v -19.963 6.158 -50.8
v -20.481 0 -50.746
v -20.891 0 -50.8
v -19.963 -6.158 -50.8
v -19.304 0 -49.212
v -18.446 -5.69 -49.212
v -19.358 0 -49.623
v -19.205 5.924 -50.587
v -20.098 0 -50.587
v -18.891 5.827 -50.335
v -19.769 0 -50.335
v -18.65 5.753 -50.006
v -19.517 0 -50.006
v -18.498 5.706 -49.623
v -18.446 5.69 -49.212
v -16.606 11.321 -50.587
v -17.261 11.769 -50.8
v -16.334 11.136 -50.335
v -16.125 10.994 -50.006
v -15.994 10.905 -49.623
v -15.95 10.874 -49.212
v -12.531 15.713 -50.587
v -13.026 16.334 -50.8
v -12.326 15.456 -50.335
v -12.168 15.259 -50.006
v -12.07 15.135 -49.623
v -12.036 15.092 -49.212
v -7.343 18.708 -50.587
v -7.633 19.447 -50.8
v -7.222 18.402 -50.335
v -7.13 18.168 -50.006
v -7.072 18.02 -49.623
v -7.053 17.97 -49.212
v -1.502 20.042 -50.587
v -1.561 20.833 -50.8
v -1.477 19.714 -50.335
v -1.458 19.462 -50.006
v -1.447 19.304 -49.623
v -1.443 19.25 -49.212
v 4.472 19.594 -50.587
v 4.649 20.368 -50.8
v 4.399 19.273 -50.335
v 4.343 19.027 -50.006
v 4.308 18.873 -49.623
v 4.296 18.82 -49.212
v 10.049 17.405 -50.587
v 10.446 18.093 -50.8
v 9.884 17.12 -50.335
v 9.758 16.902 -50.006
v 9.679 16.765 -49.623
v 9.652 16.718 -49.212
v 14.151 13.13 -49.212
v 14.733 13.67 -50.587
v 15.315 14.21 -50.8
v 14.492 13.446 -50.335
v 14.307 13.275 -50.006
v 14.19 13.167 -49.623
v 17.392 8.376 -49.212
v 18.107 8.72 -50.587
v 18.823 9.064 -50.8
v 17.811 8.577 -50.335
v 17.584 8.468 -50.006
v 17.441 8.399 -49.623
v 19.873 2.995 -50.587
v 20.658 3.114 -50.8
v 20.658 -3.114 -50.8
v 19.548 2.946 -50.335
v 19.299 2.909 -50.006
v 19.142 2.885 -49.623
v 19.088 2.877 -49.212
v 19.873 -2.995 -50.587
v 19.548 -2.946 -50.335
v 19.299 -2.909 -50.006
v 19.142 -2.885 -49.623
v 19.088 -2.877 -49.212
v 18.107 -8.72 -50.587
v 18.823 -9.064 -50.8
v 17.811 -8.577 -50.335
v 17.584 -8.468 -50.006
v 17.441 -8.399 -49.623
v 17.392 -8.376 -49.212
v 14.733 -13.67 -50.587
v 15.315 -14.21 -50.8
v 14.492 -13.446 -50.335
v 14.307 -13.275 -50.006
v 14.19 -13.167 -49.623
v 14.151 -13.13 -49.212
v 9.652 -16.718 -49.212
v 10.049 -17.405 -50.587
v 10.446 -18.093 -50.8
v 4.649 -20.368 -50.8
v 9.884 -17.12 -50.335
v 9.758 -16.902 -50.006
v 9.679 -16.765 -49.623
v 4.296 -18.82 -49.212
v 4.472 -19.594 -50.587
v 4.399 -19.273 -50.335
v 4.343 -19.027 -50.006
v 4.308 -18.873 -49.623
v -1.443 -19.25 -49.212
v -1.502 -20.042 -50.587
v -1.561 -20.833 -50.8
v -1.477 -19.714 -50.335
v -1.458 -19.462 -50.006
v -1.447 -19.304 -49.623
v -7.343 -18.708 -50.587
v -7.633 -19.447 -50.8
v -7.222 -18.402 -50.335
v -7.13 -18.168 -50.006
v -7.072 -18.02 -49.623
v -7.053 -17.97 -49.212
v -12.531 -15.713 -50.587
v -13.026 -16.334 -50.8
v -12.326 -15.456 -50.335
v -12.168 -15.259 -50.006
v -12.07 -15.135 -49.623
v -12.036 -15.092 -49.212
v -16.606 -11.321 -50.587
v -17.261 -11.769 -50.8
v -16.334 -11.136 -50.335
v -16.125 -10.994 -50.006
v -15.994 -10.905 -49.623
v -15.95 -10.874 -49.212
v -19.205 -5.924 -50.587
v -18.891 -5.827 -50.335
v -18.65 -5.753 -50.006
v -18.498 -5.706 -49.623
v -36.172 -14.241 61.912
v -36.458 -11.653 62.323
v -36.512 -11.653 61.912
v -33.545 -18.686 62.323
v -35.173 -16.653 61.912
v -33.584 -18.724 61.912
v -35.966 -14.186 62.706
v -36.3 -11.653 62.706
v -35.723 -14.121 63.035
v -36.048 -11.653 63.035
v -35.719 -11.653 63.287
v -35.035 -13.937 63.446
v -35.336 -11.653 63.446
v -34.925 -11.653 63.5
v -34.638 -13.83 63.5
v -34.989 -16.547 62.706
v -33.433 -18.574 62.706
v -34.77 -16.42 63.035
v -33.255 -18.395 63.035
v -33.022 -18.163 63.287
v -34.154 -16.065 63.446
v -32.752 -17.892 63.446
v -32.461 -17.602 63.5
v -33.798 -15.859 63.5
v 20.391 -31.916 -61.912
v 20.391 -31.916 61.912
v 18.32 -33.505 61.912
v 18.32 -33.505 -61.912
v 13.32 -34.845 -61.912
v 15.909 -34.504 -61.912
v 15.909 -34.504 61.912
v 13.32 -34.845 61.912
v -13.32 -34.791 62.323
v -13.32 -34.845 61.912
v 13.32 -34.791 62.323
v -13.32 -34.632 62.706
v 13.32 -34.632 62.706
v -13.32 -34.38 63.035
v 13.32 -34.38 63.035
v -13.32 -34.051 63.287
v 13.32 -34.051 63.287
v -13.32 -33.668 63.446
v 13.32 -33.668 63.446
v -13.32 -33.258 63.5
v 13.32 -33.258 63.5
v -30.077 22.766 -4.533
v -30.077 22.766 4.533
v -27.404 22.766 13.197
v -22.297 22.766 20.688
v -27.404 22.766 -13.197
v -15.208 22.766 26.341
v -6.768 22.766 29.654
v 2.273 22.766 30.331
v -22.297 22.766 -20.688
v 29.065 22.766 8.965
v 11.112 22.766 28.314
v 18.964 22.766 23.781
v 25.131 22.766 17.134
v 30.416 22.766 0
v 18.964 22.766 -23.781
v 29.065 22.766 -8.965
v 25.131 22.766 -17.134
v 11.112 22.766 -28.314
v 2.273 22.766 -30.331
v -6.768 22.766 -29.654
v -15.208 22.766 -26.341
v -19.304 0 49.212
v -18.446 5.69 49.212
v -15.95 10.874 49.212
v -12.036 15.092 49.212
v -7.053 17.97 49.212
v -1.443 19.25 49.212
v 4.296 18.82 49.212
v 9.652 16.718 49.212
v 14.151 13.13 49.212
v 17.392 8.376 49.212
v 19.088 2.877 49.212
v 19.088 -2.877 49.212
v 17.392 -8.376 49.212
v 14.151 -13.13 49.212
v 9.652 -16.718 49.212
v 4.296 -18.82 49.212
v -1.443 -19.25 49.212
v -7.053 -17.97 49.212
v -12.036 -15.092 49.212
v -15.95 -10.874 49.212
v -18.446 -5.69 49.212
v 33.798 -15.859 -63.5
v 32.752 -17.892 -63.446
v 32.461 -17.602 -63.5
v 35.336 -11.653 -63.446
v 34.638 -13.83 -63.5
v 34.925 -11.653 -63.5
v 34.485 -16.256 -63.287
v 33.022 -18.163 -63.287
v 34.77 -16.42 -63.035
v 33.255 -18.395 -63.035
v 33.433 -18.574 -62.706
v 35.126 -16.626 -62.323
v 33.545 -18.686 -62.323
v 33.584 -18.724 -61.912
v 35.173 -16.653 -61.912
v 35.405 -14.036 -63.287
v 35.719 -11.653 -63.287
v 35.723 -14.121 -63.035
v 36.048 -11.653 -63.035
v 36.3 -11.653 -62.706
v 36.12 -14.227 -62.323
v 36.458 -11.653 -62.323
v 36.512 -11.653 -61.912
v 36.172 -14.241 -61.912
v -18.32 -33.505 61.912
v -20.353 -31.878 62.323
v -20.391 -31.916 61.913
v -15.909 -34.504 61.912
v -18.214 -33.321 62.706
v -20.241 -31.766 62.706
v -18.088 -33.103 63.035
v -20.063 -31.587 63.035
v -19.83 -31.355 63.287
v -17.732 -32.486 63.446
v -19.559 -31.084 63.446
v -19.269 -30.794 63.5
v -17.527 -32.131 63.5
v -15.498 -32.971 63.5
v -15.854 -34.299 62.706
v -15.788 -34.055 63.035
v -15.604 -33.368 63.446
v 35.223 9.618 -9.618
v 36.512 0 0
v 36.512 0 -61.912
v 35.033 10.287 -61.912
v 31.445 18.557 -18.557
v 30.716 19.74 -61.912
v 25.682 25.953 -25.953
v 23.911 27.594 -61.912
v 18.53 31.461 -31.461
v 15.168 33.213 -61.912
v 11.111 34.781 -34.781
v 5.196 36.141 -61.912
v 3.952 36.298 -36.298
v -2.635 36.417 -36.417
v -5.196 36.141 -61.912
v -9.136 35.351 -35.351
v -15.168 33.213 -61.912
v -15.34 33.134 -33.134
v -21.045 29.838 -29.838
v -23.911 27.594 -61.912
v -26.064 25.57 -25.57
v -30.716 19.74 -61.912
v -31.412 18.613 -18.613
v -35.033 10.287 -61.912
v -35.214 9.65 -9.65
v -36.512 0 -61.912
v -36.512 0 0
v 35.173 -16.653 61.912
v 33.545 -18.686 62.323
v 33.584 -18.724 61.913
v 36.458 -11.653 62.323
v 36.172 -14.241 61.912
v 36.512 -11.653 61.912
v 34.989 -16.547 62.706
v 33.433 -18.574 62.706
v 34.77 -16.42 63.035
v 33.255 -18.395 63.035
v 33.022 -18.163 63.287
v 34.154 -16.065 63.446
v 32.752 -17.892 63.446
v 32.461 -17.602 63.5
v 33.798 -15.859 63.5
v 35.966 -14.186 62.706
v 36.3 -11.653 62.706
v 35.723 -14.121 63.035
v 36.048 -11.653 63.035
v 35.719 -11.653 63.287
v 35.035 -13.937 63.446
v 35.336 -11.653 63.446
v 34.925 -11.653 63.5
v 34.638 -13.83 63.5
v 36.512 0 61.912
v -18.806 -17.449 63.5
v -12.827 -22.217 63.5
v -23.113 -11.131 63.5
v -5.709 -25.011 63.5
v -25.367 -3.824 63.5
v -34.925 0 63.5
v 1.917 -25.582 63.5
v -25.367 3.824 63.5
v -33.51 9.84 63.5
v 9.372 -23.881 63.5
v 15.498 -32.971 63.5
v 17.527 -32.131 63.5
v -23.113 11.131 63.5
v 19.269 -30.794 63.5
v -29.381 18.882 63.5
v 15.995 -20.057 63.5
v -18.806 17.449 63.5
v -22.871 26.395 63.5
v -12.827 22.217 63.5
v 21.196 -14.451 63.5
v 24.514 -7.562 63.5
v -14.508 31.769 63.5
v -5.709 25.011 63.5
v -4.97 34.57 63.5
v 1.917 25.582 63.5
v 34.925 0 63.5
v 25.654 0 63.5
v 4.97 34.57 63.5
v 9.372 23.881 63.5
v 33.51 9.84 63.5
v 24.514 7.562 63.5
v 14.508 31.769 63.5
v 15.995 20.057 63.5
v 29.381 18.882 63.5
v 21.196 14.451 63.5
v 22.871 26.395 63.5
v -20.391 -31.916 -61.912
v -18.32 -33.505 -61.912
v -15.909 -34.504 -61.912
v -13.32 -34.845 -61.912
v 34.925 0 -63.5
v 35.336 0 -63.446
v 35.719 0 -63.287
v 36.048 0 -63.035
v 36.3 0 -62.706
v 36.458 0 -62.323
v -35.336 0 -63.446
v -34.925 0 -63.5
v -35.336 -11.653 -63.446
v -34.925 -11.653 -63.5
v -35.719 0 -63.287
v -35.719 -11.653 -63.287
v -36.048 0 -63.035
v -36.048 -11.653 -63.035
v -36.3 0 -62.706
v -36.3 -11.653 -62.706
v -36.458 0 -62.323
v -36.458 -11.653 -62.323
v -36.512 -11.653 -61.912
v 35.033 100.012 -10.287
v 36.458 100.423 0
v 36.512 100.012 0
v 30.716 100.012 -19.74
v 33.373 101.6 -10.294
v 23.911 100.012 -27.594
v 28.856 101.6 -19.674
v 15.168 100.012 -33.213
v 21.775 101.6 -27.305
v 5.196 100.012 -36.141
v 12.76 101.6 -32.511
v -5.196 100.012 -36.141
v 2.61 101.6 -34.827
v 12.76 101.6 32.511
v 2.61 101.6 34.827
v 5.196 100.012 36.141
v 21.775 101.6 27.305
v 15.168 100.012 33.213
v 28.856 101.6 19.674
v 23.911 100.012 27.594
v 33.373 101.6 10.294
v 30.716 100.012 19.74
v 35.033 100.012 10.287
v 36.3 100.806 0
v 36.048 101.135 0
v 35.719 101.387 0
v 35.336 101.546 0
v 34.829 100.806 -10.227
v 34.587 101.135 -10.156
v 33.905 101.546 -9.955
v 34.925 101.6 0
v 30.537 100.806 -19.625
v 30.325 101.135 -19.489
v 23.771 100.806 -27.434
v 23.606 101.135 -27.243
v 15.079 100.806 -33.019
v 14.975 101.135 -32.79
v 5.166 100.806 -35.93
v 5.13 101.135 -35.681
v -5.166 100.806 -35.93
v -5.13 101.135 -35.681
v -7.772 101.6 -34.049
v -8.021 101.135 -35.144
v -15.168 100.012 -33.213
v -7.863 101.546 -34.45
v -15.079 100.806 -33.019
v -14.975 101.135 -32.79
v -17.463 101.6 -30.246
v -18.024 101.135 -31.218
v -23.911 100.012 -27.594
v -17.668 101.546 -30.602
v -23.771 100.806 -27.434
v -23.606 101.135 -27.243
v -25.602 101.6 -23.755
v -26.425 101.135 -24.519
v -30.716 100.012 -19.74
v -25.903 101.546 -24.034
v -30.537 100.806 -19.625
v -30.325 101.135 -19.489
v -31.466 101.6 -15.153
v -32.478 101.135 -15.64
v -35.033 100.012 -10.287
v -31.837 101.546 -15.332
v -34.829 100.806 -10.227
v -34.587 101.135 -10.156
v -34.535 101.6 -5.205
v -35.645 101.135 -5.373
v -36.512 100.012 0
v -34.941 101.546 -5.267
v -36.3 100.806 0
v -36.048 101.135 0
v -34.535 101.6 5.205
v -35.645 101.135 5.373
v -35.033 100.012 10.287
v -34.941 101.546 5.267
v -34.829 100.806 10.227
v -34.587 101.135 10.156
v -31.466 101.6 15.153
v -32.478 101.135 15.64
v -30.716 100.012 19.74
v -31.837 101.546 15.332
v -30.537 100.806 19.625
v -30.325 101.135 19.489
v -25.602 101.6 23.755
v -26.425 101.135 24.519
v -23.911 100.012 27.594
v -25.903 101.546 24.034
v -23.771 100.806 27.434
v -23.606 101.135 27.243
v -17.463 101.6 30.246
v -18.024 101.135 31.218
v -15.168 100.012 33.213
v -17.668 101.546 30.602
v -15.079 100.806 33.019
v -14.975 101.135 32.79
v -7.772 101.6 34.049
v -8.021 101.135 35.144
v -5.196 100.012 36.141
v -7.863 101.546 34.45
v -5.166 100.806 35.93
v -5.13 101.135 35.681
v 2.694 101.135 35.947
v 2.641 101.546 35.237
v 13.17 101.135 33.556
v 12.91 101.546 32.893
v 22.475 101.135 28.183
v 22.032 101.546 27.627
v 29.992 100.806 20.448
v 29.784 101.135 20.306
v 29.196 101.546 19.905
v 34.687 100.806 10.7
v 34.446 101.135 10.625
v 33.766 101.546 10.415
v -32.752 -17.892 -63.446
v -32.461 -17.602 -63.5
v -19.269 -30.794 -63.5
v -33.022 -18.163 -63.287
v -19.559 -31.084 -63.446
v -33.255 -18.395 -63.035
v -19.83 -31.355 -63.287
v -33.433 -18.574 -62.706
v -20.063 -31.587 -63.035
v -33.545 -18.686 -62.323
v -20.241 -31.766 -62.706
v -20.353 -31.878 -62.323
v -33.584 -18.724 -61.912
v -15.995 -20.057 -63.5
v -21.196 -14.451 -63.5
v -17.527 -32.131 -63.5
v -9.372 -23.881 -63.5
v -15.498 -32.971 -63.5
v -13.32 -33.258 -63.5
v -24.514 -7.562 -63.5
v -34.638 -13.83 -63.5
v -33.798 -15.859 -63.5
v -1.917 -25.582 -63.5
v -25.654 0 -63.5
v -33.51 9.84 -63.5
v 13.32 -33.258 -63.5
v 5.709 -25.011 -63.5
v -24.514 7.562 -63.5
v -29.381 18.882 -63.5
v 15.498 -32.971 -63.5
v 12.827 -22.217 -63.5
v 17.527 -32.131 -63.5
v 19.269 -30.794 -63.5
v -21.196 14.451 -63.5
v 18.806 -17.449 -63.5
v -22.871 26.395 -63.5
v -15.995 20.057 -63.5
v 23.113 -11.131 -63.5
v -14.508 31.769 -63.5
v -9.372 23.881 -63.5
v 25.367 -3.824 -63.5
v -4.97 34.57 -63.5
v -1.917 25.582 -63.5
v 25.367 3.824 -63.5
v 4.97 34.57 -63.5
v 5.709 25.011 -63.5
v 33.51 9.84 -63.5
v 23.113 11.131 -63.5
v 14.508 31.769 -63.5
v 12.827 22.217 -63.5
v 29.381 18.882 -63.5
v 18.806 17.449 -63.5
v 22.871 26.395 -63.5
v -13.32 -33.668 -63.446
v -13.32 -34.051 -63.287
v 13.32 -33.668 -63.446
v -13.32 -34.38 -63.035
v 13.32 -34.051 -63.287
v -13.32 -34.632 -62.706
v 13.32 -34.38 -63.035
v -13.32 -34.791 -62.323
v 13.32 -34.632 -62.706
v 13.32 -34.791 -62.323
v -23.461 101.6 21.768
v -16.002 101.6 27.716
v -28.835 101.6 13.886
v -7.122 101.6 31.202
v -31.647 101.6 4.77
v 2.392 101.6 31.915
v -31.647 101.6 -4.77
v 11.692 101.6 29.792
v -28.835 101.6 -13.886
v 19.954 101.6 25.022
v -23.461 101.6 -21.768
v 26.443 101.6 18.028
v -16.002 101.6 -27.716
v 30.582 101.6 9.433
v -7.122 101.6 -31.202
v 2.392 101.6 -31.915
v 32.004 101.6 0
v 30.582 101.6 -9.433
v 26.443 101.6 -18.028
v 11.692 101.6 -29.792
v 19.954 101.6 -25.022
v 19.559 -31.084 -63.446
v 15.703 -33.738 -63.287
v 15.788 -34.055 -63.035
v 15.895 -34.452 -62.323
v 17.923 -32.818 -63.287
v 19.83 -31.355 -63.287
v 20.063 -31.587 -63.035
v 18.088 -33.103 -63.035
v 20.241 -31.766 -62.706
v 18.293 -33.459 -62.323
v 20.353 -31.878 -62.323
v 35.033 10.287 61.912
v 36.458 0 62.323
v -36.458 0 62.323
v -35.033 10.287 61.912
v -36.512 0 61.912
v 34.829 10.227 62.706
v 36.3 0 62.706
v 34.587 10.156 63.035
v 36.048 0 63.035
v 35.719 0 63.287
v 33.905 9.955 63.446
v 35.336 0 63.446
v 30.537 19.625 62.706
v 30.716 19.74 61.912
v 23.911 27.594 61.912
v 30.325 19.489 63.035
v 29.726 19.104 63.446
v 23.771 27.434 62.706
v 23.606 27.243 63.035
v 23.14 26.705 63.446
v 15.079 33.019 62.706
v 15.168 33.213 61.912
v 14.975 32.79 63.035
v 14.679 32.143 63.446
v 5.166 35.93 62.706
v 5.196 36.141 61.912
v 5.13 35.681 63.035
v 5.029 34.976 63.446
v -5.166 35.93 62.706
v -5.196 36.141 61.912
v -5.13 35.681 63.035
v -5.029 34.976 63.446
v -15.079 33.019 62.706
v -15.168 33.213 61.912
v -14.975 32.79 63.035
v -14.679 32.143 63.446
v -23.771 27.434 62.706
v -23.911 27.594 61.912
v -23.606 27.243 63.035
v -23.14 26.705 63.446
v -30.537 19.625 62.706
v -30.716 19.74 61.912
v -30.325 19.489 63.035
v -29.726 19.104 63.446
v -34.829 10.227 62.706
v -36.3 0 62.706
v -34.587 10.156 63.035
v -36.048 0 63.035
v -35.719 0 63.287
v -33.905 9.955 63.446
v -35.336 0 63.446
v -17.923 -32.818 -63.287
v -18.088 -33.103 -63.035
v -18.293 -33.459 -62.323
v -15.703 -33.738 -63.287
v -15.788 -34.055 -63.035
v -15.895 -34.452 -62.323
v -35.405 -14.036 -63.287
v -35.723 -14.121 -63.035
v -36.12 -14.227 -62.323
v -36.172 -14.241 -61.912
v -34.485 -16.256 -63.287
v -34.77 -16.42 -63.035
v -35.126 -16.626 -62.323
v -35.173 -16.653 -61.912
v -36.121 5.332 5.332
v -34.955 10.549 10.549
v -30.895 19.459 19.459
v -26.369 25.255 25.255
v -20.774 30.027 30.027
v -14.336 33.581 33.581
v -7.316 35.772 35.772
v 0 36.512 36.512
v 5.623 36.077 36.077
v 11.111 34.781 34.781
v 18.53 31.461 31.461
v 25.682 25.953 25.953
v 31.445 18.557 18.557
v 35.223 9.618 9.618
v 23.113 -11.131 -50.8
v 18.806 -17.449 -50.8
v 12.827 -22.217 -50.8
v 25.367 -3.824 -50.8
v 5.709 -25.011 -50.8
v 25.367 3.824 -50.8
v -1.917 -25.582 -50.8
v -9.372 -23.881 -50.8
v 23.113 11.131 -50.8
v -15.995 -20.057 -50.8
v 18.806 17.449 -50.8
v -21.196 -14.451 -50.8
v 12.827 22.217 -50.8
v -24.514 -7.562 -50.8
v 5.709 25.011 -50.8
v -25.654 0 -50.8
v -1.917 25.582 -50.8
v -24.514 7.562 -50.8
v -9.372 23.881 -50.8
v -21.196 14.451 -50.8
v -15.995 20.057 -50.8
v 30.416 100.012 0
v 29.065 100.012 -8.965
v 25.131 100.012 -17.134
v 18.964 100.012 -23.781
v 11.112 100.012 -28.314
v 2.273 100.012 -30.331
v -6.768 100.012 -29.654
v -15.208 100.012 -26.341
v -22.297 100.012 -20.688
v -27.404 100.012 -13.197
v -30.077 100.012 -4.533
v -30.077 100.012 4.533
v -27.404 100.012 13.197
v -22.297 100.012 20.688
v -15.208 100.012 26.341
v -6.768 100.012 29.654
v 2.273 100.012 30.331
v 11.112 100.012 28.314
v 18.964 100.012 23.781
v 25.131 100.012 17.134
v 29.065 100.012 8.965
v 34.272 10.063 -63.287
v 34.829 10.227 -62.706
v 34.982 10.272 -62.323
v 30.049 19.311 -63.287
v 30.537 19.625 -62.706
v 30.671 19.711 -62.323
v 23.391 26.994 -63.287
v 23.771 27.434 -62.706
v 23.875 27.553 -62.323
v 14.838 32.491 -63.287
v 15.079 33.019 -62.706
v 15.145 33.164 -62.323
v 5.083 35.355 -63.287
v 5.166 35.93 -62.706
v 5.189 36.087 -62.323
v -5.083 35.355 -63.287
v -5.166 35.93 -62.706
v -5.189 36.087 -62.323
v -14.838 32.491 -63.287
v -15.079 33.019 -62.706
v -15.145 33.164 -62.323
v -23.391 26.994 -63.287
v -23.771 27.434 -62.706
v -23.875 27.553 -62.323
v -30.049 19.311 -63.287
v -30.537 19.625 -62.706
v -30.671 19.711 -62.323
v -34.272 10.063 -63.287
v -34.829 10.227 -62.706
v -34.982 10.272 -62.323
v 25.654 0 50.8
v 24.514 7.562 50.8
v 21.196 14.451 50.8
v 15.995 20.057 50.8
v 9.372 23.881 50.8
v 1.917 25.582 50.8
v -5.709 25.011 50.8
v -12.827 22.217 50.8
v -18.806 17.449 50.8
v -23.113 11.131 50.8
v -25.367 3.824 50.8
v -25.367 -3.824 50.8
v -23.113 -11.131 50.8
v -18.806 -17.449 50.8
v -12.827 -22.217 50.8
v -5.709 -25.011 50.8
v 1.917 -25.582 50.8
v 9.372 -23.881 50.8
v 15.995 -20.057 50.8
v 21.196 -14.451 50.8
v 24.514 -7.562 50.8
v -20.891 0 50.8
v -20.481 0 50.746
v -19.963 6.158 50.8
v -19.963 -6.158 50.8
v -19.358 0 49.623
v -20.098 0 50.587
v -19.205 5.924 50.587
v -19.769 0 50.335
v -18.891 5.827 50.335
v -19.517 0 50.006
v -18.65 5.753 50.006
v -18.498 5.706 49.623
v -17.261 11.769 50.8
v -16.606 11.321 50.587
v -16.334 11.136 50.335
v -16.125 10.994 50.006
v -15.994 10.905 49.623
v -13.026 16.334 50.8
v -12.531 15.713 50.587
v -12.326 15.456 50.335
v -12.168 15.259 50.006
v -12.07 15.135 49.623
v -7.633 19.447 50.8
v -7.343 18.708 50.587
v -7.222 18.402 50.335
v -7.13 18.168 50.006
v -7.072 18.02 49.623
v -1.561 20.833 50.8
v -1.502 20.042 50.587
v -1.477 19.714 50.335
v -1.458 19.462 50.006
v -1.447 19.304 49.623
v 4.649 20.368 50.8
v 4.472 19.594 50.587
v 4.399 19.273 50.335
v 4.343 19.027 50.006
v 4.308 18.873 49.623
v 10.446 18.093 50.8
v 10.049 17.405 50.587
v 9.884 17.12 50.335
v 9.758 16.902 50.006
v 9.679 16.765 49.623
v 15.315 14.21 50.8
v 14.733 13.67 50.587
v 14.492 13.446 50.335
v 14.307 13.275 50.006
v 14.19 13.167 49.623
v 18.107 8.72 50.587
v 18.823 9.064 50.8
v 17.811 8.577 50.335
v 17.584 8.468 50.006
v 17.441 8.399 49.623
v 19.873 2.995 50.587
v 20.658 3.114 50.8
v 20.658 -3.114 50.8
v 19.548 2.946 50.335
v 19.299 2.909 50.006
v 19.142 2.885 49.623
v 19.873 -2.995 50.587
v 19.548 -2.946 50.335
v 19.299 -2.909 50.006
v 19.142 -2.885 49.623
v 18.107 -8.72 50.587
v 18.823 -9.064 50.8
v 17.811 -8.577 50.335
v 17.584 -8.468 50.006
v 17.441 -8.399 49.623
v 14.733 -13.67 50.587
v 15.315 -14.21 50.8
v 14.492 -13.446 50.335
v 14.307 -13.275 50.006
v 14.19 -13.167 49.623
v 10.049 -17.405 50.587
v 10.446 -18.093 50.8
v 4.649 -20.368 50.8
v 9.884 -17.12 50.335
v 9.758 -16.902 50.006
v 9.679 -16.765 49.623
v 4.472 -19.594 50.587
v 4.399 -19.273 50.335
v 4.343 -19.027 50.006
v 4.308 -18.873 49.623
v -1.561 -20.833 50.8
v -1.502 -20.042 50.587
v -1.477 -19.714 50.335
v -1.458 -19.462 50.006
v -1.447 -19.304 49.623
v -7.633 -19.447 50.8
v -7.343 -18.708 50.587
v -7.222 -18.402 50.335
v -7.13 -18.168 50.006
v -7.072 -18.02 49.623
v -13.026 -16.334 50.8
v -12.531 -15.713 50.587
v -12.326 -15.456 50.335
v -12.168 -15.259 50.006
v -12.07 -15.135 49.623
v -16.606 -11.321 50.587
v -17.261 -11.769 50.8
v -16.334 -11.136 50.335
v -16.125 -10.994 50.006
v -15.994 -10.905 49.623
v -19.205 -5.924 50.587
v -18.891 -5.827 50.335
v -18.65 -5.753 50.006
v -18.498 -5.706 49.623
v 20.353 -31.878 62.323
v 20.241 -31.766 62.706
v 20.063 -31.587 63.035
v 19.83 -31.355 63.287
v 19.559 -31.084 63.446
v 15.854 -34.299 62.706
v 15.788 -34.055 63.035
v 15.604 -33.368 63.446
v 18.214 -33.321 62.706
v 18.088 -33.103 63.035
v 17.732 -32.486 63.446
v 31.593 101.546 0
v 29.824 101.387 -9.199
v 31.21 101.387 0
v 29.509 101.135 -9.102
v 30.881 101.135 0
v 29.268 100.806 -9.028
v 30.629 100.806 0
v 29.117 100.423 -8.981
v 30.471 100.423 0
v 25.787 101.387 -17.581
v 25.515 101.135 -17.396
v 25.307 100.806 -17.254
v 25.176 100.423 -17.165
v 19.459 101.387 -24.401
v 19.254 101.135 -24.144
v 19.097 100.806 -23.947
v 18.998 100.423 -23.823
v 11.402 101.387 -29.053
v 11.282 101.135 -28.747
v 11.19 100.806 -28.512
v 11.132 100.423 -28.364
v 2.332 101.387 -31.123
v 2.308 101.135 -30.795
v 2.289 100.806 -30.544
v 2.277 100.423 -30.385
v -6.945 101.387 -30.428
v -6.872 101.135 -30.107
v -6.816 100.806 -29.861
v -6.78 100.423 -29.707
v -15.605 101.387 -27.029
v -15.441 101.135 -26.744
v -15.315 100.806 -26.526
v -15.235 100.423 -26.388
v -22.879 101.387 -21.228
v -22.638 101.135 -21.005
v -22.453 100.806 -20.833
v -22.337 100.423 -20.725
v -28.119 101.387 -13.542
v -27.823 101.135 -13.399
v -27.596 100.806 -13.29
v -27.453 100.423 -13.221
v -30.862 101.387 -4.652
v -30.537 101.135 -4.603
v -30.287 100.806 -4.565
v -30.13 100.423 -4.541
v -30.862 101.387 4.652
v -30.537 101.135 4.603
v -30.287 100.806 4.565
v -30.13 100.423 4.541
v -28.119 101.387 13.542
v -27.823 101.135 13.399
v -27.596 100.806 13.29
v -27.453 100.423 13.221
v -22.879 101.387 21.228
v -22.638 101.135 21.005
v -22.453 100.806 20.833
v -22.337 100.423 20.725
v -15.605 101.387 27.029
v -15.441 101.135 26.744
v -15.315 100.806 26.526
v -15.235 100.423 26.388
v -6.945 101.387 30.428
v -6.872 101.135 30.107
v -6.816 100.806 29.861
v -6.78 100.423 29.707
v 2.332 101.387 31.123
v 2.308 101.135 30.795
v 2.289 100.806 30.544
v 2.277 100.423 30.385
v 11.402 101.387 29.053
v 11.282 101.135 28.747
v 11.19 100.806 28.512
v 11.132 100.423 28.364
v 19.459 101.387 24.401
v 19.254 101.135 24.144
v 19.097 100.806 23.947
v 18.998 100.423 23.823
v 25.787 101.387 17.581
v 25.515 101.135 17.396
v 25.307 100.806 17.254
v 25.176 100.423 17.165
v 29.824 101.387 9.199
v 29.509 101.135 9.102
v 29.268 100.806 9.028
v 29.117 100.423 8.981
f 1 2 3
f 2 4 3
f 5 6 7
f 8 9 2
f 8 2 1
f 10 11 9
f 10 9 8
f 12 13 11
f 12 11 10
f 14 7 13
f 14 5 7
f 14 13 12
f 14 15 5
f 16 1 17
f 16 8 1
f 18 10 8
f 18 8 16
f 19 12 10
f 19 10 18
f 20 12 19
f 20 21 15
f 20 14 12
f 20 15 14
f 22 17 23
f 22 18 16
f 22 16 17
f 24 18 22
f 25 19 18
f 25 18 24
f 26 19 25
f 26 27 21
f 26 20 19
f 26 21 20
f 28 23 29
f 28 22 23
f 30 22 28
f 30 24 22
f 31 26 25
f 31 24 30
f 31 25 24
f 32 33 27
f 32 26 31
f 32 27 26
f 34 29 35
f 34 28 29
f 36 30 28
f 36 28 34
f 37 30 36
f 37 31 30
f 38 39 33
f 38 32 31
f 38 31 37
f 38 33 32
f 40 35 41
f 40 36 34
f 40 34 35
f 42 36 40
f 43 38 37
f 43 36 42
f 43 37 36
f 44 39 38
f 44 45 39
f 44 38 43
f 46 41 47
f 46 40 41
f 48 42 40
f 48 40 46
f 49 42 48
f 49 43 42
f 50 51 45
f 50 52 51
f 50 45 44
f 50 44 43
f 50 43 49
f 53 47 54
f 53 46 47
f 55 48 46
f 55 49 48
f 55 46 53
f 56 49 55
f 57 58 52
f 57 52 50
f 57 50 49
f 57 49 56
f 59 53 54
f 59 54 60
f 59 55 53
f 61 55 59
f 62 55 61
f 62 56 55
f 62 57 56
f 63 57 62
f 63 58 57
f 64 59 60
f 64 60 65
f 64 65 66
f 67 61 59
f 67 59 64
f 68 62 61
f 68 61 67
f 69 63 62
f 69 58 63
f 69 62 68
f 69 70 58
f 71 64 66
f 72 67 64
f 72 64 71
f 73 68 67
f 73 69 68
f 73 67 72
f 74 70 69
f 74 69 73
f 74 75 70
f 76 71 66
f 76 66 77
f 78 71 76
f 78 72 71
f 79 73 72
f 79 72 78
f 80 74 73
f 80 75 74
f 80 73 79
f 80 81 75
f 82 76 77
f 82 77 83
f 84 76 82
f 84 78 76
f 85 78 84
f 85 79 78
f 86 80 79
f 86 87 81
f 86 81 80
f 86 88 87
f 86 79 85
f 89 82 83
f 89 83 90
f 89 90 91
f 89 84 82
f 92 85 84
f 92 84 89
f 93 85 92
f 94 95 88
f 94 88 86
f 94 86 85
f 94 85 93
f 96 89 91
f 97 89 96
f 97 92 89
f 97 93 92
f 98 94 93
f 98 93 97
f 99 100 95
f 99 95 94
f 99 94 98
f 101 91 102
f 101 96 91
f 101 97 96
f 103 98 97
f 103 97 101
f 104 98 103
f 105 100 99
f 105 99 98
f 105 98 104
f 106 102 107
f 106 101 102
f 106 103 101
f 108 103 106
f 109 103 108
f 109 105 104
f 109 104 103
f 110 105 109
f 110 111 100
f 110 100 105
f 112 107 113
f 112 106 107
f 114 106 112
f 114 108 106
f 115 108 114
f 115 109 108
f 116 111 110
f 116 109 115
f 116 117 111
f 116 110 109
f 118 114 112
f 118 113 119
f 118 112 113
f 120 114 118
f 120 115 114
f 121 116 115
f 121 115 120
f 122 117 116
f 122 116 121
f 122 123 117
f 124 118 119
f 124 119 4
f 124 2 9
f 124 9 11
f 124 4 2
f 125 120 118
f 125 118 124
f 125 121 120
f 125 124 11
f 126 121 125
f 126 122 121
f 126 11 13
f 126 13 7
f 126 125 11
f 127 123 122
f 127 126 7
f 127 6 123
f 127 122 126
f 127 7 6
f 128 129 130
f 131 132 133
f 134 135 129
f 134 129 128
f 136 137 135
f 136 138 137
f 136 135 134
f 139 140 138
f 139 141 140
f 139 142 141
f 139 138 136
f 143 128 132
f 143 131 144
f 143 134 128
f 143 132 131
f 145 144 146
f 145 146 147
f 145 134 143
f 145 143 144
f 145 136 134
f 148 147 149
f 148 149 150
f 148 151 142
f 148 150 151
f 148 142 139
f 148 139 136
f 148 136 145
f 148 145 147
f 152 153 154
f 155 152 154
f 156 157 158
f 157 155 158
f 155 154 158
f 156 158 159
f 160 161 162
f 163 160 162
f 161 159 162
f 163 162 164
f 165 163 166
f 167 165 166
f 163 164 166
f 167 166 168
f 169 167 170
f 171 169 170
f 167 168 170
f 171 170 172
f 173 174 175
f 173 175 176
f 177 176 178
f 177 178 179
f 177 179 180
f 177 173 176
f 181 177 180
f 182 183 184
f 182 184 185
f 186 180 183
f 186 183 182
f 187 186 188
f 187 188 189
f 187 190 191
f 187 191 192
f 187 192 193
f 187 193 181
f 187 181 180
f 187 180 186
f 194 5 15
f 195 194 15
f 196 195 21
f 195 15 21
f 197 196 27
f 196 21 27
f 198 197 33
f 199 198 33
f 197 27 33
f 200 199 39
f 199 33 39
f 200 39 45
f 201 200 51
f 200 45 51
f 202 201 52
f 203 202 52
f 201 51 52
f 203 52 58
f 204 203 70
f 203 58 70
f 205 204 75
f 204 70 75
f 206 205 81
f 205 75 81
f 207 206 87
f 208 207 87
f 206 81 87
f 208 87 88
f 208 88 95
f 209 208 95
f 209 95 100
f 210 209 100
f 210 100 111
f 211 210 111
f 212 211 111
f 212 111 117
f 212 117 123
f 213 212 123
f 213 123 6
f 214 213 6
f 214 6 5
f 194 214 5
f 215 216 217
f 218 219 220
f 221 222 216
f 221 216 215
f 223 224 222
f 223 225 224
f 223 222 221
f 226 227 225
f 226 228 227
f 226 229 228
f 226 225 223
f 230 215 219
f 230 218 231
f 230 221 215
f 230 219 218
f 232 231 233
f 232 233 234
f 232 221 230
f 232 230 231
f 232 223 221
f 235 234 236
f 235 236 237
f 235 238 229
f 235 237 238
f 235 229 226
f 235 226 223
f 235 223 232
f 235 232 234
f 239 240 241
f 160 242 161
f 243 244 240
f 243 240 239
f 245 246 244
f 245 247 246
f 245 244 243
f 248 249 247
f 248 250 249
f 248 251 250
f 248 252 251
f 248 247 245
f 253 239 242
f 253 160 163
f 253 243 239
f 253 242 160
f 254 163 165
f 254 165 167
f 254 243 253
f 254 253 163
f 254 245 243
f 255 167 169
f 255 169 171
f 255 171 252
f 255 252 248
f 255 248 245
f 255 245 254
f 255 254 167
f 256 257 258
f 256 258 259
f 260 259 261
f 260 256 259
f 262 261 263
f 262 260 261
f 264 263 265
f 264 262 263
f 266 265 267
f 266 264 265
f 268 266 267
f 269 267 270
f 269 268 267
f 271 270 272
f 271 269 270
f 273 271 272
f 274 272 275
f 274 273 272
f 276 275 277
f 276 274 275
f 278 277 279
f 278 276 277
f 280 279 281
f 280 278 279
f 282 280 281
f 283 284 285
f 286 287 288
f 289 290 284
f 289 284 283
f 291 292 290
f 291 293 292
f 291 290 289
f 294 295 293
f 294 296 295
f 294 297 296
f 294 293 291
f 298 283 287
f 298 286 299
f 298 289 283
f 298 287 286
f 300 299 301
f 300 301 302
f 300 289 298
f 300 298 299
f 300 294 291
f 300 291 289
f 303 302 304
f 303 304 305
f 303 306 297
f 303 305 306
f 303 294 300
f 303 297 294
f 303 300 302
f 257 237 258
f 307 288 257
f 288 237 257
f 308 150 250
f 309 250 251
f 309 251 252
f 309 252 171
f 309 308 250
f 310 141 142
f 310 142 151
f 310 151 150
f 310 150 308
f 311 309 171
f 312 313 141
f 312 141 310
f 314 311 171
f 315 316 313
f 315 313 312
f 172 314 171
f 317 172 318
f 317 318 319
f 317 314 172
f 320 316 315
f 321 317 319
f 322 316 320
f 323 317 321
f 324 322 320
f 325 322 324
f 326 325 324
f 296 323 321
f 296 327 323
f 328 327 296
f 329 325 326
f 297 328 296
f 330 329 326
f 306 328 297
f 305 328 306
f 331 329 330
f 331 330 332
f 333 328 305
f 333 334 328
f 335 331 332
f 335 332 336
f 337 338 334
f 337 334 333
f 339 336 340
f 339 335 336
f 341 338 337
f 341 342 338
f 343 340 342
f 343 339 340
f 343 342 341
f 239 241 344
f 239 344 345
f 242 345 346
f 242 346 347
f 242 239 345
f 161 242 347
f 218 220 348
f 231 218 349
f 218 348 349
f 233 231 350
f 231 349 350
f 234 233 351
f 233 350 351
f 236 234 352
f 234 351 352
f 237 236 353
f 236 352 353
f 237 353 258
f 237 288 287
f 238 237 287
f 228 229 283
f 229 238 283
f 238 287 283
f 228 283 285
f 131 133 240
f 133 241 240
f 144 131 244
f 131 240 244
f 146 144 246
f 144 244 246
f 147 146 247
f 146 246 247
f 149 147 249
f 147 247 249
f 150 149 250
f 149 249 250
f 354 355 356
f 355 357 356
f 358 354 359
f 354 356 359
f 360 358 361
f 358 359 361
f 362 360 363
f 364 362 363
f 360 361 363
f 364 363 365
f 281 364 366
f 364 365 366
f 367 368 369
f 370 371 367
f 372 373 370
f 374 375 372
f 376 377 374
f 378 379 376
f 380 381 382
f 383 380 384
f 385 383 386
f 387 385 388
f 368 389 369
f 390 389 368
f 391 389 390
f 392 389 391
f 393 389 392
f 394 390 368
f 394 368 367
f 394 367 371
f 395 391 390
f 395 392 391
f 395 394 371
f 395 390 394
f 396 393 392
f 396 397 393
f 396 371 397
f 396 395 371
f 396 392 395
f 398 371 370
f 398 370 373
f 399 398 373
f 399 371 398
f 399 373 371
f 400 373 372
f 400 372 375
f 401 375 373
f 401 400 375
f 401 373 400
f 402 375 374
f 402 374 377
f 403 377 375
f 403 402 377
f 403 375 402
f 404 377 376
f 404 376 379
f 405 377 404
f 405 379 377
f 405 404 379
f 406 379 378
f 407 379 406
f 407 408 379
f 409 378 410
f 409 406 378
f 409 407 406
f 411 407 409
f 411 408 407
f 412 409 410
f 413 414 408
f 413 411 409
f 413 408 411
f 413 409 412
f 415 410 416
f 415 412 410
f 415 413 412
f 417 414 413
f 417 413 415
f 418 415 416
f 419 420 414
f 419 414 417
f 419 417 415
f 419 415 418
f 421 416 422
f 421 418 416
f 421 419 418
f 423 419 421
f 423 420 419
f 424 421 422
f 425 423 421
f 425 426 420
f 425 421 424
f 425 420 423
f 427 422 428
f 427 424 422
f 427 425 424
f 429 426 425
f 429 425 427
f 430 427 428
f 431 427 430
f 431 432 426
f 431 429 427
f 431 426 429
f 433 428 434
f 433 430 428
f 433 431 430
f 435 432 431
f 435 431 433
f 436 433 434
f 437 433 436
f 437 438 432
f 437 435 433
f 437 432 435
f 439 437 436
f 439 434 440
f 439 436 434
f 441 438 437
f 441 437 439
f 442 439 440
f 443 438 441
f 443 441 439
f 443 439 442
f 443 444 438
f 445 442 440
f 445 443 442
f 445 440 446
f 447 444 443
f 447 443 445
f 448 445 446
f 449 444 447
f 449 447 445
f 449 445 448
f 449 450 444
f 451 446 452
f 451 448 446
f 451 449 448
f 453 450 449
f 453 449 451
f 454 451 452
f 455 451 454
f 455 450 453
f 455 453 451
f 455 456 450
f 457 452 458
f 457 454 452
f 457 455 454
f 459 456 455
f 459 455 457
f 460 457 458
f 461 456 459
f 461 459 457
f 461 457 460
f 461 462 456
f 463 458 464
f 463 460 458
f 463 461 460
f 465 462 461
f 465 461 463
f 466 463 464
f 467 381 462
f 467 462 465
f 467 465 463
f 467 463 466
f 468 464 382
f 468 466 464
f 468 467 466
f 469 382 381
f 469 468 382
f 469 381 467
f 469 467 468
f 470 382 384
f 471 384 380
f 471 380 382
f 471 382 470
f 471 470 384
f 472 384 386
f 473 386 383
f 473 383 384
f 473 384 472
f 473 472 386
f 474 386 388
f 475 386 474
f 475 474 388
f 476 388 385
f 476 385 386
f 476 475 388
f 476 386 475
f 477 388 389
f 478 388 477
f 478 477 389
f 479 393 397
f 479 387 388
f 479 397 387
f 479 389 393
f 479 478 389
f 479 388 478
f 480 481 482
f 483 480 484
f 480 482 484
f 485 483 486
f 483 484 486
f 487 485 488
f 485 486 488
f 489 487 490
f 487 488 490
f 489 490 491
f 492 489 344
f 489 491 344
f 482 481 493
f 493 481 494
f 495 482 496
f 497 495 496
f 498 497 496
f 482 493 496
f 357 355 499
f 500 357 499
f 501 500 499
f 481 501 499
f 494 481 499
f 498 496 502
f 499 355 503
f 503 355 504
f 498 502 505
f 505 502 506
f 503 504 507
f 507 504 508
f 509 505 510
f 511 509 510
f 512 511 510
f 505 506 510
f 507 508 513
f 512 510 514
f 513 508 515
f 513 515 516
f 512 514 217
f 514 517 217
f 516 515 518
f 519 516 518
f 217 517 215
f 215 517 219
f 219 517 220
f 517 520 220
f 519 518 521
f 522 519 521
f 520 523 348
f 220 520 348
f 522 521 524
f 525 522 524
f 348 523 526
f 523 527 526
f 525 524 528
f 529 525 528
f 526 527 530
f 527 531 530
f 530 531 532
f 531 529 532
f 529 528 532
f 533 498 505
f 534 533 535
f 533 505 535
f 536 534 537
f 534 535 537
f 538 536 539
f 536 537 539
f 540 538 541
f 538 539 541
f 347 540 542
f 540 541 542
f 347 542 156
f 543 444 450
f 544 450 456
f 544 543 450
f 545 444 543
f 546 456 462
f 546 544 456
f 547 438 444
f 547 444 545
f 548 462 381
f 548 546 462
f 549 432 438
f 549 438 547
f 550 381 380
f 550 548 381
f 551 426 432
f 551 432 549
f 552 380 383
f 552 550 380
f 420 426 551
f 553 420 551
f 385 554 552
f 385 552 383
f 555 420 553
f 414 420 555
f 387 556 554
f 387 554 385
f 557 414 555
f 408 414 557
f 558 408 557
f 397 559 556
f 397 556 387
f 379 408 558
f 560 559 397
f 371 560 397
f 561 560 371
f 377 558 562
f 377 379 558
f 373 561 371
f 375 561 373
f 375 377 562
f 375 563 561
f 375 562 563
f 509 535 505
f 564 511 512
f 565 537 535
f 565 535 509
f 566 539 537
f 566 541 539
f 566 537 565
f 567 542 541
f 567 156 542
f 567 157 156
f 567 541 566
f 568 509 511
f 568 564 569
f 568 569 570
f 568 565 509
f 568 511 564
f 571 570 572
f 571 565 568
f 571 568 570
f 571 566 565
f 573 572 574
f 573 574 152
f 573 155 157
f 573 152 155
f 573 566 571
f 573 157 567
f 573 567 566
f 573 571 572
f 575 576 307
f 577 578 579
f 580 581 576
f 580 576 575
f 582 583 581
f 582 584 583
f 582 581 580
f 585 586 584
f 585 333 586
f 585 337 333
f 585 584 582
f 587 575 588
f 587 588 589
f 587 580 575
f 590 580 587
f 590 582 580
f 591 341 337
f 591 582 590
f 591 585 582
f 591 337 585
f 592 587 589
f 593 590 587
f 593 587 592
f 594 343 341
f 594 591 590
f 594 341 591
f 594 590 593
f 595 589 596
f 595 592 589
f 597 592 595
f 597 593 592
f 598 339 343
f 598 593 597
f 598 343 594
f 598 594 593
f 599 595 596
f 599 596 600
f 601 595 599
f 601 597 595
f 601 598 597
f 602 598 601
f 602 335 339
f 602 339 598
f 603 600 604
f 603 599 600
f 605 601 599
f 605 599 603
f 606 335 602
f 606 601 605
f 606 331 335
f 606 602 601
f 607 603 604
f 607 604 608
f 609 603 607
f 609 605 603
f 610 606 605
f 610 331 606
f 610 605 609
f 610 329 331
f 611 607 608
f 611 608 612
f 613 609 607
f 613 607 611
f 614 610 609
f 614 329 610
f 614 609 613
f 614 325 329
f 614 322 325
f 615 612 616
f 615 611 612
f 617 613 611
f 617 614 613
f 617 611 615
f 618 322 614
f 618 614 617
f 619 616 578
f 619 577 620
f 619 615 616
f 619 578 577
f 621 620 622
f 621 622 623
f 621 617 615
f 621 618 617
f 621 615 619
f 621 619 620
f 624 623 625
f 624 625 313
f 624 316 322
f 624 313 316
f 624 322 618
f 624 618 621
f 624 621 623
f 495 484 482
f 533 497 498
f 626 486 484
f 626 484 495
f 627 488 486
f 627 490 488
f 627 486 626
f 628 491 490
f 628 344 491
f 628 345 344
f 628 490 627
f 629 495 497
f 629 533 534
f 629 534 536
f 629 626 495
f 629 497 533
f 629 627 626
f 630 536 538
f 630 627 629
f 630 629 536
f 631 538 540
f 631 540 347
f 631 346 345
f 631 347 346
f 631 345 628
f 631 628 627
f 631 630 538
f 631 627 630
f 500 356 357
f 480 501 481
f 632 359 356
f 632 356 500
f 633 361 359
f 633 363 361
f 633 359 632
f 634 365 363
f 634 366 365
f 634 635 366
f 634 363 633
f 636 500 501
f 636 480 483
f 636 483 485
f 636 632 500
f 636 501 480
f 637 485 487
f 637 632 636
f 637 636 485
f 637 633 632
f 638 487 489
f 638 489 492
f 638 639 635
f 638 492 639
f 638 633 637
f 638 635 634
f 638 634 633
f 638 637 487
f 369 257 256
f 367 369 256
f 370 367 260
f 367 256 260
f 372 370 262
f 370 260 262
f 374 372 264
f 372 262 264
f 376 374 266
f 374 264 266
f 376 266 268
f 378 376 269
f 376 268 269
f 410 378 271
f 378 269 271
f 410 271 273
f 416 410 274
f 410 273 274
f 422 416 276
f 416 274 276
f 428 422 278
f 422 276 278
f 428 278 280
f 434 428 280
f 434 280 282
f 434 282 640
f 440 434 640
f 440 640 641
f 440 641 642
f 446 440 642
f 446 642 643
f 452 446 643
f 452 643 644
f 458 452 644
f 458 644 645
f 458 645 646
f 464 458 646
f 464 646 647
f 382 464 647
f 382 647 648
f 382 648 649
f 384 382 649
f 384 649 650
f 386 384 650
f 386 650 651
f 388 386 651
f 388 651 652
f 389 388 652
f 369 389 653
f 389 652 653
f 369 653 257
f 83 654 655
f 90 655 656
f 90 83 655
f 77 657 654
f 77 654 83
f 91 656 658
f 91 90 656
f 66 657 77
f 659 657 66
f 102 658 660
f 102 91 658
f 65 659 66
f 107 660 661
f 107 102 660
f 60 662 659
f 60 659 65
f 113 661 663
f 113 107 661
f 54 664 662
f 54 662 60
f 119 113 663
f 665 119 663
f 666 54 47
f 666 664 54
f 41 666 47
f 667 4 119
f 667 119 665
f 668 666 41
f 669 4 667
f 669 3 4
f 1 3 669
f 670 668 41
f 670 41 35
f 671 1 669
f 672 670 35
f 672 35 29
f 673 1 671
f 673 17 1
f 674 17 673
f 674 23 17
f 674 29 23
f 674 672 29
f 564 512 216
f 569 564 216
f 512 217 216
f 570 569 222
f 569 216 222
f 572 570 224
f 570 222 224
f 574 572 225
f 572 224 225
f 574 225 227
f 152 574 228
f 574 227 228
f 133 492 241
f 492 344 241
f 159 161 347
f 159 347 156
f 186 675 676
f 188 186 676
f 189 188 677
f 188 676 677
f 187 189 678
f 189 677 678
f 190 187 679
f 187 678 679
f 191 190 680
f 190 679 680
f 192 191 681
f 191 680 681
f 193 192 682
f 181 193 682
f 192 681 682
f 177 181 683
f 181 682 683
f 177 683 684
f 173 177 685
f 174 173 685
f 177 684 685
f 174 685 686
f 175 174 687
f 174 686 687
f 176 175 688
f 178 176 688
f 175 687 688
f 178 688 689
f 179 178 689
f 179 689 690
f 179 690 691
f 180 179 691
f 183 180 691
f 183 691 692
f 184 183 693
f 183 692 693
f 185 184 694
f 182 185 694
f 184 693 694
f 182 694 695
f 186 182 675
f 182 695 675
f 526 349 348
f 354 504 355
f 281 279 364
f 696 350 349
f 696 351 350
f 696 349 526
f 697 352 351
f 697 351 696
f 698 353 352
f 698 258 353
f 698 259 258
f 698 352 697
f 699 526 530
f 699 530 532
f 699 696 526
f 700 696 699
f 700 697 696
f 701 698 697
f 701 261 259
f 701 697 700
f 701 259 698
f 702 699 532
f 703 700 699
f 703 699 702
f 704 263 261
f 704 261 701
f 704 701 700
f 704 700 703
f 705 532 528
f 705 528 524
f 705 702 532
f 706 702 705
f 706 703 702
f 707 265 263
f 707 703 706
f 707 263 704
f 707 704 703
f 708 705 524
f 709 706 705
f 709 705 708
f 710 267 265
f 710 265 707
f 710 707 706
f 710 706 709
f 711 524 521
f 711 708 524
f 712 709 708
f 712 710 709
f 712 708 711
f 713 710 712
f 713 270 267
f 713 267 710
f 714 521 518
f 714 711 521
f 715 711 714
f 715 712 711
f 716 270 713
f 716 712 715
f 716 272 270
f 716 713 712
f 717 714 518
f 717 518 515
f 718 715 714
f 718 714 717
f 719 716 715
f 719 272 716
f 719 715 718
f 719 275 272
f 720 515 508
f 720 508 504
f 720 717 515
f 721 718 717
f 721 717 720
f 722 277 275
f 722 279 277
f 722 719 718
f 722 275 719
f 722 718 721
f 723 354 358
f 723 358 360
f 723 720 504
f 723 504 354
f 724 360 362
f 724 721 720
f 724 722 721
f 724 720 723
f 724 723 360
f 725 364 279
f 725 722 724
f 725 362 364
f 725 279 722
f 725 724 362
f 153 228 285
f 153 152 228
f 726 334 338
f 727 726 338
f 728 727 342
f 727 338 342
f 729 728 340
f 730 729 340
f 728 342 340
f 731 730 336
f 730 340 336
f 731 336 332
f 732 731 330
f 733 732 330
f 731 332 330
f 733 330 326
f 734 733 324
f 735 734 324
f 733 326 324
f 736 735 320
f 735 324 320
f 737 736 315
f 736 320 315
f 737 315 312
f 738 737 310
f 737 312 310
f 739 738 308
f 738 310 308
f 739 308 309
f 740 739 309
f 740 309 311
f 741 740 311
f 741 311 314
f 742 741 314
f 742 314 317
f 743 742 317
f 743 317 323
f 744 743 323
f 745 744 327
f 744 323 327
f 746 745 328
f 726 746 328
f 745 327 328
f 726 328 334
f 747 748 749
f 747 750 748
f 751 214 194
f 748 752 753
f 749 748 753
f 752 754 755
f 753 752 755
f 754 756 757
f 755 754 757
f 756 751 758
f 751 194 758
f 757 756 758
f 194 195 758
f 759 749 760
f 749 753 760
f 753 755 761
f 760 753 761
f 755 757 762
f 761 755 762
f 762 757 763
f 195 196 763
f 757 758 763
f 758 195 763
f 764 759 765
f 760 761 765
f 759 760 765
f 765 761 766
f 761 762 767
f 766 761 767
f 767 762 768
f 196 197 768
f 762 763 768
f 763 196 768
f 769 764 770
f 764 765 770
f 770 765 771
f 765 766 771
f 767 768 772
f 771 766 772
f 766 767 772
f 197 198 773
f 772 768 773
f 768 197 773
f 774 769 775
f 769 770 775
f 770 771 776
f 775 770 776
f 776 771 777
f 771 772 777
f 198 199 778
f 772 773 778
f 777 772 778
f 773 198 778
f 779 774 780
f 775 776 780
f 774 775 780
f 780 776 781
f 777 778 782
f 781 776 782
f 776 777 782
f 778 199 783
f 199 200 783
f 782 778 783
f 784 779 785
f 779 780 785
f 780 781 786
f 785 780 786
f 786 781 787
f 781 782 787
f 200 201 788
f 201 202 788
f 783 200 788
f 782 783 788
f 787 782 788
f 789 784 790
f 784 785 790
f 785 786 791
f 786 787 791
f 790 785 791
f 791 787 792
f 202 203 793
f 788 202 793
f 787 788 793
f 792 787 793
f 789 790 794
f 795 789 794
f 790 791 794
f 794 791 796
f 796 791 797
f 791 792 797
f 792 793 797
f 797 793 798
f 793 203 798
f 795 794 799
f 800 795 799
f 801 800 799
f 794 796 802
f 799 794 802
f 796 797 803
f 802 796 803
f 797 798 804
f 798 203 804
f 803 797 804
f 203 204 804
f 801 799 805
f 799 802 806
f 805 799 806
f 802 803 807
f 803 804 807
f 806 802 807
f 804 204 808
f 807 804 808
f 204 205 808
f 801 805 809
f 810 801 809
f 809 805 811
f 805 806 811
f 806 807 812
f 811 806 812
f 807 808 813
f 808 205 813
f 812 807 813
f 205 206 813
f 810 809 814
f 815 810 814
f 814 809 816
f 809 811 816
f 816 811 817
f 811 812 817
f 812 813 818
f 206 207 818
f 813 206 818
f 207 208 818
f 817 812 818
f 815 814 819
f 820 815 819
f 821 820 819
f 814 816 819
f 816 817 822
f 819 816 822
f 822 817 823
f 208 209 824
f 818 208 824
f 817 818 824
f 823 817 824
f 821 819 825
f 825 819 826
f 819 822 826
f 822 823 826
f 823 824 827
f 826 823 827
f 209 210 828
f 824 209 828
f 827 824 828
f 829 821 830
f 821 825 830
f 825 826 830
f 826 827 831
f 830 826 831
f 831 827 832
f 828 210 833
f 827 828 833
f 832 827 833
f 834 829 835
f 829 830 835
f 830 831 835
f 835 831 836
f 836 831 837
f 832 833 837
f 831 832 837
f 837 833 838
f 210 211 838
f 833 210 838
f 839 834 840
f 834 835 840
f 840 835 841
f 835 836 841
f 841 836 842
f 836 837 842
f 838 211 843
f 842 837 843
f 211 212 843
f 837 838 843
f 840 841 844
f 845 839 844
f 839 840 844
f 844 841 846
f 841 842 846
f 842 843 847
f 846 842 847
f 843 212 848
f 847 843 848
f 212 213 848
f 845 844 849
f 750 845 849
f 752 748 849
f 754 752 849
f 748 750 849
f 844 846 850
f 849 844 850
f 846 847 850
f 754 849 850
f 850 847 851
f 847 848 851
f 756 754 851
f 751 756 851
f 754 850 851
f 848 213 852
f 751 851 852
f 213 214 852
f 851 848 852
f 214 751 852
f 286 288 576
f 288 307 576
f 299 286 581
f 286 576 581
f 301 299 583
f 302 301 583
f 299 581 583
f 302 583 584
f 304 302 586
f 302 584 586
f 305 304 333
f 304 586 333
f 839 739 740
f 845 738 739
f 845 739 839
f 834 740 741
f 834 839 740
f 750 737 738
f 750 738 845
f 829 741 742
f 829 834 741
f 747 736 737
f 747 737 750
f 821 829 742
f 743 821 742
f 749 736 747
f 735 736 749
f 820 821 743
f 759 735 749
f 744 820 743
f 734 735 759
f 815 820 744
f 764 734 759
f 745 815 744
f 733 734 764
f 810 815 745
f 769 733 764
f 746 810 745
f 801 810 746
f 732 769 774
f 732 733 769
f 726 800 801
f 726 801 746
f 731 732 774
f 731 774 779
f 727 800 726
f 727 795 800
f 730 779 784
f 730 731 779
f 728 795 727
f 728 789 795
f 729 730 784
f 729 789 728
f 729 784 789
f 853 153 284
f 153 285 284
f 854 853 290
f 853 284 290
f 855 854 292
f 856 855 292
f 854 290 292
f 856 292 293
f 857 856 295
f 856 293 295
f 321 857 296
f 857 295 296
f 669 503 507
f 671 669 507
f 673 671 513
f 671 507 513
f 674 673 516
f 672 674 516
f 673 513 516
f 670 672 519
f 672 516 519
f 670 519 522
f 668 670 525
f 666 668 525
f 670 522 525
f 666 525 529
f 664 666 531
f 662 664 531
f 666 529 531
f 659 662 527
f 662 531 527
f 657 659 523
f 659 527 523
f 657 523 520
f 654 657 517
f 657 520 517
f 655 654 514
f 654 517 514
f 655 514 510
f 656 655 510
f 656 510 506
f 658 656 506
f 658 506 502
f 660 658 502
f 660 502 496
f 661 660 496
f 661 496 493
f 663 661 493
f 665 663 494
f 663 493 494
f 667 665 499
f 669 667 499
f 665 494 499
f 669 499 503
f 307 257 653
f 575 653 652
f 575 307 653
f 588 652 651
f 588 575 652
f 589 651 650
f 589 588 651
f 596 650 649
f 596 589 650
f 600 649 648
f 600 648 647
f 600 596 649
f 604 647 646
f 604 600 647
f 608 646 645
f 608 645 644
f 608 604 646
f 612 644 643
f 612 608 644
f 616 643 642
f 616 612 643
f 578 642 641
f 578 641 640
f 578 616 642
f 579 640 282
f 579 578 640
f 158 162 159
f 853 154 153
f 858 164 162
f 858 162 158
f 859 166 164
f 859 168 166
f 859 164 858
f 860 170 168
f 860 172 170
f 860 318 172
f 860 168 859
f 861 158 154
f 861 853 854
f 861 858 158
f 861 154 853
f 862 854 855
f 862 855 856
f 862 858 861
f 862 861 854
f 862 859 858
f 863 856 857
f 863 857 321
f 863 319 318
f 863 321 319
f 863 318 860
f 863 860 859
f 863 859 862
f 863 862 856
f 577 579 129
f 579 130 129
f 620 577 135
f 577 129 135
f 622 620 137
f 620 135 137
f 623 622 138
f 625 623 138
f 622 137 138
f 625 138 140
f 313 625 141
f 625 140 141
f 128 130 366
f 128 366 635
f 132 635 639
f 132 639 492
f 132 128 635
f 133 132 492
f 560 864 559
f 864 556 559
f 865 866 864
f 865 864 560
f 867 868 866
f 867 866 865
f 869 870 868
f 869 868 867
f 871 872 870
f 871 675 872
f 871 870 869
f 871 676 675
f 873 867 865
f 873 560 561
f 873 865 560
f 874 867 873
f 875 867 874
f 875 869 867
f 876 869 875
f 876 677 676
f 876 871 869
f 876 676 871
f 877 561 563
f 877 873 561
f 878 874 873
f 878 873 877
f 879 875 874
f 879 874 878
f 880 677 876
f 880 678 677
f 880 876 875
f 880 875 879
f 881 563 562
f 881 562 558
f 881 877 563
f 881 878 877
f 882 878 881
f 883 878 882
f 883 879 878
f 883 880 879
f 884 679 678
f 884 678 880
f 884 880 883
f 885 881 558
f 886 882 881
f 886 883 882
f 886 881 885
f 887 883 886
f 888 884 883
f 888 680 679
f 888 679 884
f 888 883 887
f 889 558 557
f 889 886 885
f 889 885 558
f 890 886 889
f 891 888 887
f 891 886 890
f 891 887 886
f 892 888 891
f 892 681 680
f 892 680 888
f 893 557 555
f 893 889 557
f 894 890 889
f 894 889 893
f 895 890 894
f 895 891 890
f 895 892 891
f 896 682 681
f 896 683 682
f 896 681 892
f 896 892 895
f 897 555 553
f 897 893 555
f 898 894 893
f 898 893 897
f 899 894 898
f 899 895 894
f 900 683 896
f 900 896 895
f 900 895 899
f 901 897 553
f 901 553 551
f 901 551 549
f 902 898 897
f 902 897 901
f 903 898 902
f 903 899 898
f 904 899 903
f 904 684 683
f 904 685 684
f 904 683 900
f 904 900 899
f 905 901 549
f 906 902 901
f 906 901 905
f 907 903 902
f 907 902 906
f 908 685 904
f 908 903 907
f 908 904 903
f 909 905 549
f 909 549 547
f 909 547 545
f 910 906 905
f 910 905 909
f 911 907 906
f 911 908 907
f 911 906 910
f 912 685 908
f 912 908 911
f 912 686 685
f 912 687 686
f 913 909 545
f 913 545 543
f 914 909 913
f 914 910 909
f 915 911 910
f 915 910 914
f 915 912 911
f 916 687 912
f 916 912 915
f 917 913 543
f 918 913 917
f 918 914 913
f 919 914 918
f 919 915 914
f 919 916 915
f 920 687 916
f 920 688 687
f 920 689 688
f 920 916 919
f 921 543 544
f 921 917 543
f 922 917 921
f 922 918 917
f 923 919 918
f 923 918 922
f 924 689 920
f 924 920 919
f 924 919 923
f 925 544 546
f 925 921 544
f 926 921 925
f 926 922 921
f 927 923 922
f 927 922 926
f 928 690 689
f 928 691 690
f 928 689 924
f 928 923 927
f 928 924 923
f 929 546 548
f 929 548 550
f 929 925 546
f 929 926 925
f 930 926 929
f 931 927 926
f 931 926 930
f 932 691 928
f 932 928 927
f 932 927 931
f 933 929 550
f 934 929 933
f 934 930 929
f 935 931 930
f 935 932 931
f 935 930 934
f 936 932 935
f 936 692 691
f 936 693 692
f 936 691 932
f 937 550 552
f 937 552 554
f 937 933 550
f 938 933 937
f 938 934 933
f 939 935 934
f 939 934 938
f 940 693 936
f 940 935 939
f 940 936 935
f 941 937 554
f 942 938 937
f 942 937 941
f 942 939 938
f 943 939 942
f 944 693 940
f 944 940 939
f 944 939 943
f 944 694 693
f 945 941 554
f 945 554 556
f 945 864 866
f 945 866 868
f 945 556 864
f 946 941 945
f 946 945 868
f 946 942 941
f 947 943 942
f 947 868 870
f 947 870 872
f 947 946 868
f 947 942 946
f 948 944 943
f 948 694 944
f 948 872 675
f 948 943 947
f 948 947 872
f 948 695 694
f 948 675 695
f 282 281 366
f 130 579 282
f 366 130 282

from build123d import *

# Parameters (mm, degrees)
BOSS_EXTRUDE1_DEPTH      = 63.5
BOSS_EXTRUDE1_DEPTH_BACK = 63.5
SKETCH3_R                = 36.5125
BOSS_EXTRUDE2_DEPTH      = 101.6
SKETCH4_R                = 19.304
CUT_EXTRUDE1_DEPTH       = 167.6875
SKETCH5_R                = 25.654
CUT_EXTRUDE2_DEPTH       = 12.7
CUT_EXTRUDE3_START       = -12.7
SKETCH6_R                = 25.654
CUT_EXTRUDE3_DEPTH       = 12.7
SKETCH7_R                = 30.4165
CUT_EXTRUDE4_DEPTH       = 78.834
CHAMFER1_SIZE            = 19.05
FILLET1_R                = 10
FILLET2_R                = 1.5875


with BuildPart() as part:
    # Sketch1 → Boss-Extrude1 (new, two sides: drawn at the far end of the back side and taken through both)
    with BuildSketch(Plane.XY.offset(-BOSS_EXTRUDE1_DEPTH_BACK)):
        with BuildLine():
            Line((-36.5125, 0), (-36.5125, -34.845102384))
            Line((-36.5125, -34.845102384), (36.5125, -34.845102384))
            Line((36.5125, -34.845102384), (36.5125, 0))
            ThreePointArc((36.5125, 0), (0, 36.5125), (-36.5125, 0))
        make_face()
    extrude(amount=BOSS_EXTRUDE1_DEPTH + BOSS_EXTRUDE1_DEPTH_BACK)

    # Sketch3 → Boss-Extrude2 (add)
    with BuildSketch(Plane(origin=(0, 0, 0), x_dir=(1, 0, 0), z_dir=(0, 1, 0))):
        Circle(SKETCH3_R)
    extrude(amount=BOSS_EXTRUDE2_DEPTH)

    # Sketch4 → Cut-Extrude1 (cut, through all)
    with BuildSketch(Plane(origin=(0, 0, -63.5), x_dir=(-1, 0, 0), z_dir=(0, 0, -1))):
        Circle(SKETCH4_R)
    extrude(amount=-CUT_EXTRUDE1_DEPTH, mode=Mode.SUBTRACT)

    # Sketch5 → Cut-Extrude2 (cut)
    with BuildSketch(Plane(origin=(0, 0, -63.5), x_dir=(-1, 0, 0), z_dir=(0, 0, -1))):
        Circle(SKETCH5_R)
    extrude(amount=-CUT_EXTRUDE2_DEPTH, mode=Mode.SUBTRACT)

    # Sketch6 → Cut-Extrude3 (cut)
    with BuildSketch(Plane.XY.offset(63.5).offset(CUT_EXTRUDE3_START)):
        Circle(SKETCH6_R)
    extrude(amount=CUT_EXTRUDE3_DEPTH, mode=Mode.SUBTRACT)

    # Sketch7 → Cut-Extrude4 (cut)
    with BuildSketch(Plane(origin=(0, 101.6, 0), x_dir=(1, 0, 0), z_dir=(0, 1, 0))):
        Circle(SKETCH7_R)
    extrude(amount=-CUT_EXTRUDE4_DEPTH, mode=Mode.SUBTRACT)

    # Chamfer1
    chamfer1_edges = [part.edges().sort_by_distance(p)[0] for p in [
        (36.5125, -34.845102384, 0),
        (-36.5125, -34.845102384, 0),
    ]]
    chamfer(chamfer1_edges, length=CHAMFER1_SIZE)

    # Fillet1
    fillet1_edges = [part.edges().sort_by_distance(p)[0] for p in [
        (36.5125, -15.795102384, 0),
        (17.4625, -34.845102384, 0),
        (-17.4625, -34.845102384, 0),
        (-36.5125, -15.795102384, 0),
    ]]
    fillet(fillet1_edges, radius=FILLET1_R)

    # Fillet2
    fillet2_edges = [part.edges().sort_by_distance(p)[0] for p in [
        (36.5125, -5.82648338, -63.5),
        (35.751295325, -15.479801084, -63.5),
        (26.9875, -25.320102384, -63.5),
        (17.1471987, -34.083897709, -63.5),
        (0, -34.845102384, -63.5),
        (-17.1471987, -34.083897709, -63.5),
        (-26.9875, -25.320102384, -63.5),
        (-35.751295325, -15.479801084, -63.5),
        (-36.5125, -5.82648338, -63.5),
        (36.5125, -5.82648338, 63.5),
        (35.751295325, -15.479801084, 63.5),
        (26.9875, -25.320102384, 63.5),
        (17.1471987, -34.083897709, 63.5),
        (0, -34.845102384, 63.5),
        (-17.1471987, -34.083897709, 63.5),
        (-26.9875, -25.320102384, 63.5),
        (-35.751295325, -15.479801084, 63.5),
        (-36.5125, -5.82648338, 63.5),
        (19.304, 0, -50.8),
        (19.304, 0, 50.8),
        (-30.4165, 101.6, 0),
        (-36.5125, 101.6, 0),
        (0, 36.5125, -63.5),
        (0, 36.5125, 63.5),
    ]]
    fillet(fillet2_edges, radius=FILLET2_R)


solid = part.part
